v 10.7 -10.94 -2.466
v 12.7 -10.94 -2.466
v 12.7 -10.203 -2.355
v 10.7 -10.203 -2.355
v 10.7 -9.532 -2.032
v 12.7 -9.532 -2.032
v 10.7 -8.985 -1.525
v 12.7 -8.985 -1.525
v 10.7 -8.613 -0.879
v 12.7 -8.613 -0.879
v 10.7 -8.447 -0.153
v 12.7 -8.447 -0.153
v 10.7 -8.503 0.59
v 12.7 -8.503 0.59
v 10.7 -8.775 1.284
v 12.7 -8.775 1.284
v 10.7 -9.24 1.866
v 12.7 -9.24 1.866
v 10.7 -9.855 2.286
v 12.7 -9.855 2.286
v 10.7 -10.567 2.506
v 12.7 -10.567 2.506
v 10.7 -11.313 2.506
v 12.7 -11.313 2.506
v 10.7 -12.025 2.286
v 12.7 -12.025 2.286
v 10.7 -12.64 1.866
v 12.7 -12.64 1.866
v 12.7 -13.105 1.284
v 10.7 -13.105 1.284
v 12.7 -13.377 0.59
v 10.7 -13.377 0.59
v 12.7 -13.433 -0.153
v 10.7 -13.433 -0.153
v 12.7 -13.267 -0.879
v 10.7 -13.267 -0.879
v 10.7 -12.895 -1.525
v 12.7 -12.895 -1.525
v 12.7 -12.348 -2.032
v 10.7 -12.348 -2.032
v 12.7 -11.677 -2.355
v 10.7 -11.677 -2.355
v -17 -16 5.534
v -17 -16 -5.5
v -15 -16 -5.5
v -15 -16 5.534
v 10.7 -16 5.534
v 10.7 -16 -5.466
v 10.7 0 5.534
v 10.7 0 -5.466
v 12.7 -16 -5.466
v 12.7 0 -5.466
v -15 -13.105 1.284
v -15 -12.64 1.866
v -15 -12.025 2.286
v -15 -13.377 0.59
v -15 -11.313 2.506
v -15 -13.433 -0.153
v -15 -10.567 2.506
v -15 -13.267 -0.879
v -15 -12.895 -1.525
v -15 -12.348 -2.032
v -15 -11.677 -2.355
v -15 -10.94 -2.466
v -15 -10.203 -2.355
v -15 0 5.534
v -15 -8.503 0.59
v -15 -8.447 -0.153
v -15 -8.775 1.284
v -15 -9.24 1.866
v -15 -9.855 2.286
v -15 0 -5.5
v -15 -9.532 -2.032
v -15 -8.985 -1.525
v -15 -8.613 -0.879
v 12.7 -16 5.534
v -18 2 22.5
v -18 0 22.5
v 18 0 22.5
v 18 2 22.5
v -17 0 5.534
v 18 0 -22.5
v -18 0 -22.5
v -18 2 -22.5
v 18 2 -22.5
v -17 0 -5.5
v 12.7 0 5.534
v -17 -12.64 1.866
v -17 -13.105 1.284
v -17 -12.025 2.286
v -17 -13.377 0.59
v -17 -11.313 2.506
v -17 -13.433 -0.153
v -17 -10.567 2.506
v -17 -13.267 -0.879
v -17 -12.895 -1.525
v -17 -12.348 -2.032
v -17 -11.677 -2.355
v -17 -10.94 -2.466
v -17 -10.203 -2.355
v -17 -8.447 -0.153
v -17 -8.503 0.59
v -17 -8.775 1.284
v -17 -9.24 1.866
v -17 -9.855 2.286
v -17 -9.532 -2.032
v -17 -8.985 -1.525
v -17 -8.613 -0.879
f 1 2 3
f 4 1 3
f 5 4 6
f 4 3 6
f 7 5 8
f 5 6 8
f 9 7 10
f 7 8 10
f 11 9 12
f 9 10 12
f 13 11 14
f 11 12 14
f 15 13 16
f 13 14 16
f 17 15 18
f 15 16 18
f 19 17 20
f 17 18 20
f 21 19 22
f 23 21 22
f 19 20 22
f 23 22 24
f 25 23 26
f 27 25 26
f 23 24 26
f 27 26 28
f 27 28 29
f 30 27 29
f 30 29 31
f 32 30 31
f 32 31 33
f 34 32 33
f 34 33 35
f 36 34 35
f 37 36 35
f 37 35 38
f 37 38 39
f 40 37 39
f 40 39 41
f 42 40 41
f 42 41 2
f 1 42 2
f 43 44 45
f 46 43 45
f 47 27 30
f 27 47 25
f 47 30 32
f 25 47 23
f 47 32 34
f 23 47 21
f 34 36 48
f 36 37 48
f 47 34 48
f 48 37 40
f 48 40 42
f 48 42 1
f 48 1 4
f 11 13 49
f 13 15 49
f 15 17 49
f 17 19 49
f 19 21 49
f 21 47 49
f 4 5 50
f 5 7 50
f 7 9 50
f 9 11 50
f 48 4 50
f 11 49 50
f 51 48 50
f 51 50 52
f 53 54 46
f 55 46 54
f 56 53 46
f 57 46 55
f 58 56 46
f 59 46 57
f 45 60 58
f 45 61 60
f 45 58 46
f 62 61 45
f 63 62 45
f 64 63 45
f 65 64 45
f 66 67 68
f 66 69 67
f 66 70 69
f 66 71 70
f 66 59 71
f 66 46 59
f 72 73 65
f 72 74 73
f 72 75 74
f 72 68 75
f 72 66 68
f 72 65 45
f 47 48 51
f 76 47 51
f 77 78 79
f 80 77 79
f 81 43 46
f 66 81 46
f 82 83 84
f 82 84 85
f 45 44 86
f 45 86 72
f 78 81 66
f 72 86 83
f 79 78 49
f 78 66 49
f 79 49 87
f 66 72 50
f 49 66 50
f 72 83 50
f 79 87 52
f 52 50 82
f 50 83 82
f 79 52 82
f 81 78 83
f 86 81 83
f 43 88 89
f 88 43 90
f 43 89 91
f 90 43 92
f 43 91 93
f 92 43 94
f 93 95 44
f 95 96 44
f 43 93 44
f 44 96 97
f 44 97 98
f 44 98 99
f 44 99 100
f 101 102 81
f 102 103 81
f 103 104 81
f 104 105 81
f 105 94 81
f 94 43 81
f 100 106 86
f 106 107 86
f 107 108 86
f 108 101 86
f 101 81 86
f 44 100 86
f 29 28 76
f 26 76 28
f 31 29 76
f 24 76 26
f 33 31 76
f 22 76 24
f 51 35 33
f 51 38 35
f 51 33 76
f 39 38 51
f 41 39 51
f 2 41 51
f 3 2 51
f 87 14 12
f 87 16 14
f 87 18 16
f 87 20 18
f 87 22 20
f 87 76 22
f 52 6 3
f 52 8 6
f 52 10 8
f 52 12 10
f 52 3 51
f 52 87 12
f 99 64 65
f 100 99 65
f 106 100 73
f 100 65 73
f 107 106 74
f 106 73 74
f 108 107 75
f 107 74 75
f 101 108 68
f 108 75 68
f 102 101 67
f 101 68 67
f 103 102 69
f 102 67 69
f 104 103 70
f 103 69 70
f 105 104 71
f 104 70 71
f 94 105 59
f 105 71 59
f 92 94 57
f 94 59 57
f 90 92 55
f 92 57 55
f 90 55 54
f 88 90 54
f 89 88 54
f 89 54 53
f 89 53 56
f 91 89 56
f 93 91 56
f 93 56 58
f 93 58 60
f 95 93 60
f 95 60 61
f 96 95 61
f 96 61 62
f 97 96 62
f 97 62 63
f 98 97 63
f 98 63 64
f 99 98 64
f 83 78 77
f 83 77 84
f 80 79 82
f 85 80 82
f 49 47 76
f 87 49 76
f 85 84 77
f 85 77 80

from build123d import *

# Parameters (mm, degrees)
CROQUIS1_W              = 36
CROQUIS1_H              = 45
SALIENTE_EXTRUIR1_DEPTH = 2
CROQUIS2_W              = 2
CROQUIS2_H              = 11
CROQUIS2_H_2            = 11.033856499
SALIENTE_EXTRUIR2_DEPTH = 18
CROQUIS3_R              = 2.5
CORTAR_EXTRUIR1_DEPTH   = 33


with BuildPart() as part:
    # Croquis1 → Saliente-Extruir1 (new body)
    with BuildSketch(Plane(origin=(0, 0, 0), x_dir=(1, 0, 0), z_dir=(0, 1, 0))):
        Rectangle(CROQUIS1_W, CROQUIS1_H)
    extrude(amount=SALIENTE_EXTRUIR1_DEPTH)

    # Croquis2 → Saliente-Extruir2 (add)
    with BuildSketch(Plane(origin=(0, 2, 0), x_dir=(1, 0, 0), z_dir=(0, 1, 0))):
        with Locations((11.7, -0.033856499)):
            Rectangle(CROQUIS2_W, CROQUIS2_H)
        with Locations((-16, -0.01692825)):
            Rectangle(CROQUIS2_W, CROQUIS2_H_2)
    extrude(amount=-SALIENTE_EXTRUIR2_DEPTH)

    # Croquis3 → Cortar-Extruir1 (cut)
    with BuildSketch(Plane(origin=(12.7, 0, 0), x_dir=(0, 0, -1), z_dir=(1, 0, 0))):
        with Locations((-0.033856499, -10.94)):
            Circle(CROQUIS3_R)
    extrude(amount=-CORTAR_EXTRUIR1_DEPTH, mode=Mode.SUBTRACT)


solid = part.part
